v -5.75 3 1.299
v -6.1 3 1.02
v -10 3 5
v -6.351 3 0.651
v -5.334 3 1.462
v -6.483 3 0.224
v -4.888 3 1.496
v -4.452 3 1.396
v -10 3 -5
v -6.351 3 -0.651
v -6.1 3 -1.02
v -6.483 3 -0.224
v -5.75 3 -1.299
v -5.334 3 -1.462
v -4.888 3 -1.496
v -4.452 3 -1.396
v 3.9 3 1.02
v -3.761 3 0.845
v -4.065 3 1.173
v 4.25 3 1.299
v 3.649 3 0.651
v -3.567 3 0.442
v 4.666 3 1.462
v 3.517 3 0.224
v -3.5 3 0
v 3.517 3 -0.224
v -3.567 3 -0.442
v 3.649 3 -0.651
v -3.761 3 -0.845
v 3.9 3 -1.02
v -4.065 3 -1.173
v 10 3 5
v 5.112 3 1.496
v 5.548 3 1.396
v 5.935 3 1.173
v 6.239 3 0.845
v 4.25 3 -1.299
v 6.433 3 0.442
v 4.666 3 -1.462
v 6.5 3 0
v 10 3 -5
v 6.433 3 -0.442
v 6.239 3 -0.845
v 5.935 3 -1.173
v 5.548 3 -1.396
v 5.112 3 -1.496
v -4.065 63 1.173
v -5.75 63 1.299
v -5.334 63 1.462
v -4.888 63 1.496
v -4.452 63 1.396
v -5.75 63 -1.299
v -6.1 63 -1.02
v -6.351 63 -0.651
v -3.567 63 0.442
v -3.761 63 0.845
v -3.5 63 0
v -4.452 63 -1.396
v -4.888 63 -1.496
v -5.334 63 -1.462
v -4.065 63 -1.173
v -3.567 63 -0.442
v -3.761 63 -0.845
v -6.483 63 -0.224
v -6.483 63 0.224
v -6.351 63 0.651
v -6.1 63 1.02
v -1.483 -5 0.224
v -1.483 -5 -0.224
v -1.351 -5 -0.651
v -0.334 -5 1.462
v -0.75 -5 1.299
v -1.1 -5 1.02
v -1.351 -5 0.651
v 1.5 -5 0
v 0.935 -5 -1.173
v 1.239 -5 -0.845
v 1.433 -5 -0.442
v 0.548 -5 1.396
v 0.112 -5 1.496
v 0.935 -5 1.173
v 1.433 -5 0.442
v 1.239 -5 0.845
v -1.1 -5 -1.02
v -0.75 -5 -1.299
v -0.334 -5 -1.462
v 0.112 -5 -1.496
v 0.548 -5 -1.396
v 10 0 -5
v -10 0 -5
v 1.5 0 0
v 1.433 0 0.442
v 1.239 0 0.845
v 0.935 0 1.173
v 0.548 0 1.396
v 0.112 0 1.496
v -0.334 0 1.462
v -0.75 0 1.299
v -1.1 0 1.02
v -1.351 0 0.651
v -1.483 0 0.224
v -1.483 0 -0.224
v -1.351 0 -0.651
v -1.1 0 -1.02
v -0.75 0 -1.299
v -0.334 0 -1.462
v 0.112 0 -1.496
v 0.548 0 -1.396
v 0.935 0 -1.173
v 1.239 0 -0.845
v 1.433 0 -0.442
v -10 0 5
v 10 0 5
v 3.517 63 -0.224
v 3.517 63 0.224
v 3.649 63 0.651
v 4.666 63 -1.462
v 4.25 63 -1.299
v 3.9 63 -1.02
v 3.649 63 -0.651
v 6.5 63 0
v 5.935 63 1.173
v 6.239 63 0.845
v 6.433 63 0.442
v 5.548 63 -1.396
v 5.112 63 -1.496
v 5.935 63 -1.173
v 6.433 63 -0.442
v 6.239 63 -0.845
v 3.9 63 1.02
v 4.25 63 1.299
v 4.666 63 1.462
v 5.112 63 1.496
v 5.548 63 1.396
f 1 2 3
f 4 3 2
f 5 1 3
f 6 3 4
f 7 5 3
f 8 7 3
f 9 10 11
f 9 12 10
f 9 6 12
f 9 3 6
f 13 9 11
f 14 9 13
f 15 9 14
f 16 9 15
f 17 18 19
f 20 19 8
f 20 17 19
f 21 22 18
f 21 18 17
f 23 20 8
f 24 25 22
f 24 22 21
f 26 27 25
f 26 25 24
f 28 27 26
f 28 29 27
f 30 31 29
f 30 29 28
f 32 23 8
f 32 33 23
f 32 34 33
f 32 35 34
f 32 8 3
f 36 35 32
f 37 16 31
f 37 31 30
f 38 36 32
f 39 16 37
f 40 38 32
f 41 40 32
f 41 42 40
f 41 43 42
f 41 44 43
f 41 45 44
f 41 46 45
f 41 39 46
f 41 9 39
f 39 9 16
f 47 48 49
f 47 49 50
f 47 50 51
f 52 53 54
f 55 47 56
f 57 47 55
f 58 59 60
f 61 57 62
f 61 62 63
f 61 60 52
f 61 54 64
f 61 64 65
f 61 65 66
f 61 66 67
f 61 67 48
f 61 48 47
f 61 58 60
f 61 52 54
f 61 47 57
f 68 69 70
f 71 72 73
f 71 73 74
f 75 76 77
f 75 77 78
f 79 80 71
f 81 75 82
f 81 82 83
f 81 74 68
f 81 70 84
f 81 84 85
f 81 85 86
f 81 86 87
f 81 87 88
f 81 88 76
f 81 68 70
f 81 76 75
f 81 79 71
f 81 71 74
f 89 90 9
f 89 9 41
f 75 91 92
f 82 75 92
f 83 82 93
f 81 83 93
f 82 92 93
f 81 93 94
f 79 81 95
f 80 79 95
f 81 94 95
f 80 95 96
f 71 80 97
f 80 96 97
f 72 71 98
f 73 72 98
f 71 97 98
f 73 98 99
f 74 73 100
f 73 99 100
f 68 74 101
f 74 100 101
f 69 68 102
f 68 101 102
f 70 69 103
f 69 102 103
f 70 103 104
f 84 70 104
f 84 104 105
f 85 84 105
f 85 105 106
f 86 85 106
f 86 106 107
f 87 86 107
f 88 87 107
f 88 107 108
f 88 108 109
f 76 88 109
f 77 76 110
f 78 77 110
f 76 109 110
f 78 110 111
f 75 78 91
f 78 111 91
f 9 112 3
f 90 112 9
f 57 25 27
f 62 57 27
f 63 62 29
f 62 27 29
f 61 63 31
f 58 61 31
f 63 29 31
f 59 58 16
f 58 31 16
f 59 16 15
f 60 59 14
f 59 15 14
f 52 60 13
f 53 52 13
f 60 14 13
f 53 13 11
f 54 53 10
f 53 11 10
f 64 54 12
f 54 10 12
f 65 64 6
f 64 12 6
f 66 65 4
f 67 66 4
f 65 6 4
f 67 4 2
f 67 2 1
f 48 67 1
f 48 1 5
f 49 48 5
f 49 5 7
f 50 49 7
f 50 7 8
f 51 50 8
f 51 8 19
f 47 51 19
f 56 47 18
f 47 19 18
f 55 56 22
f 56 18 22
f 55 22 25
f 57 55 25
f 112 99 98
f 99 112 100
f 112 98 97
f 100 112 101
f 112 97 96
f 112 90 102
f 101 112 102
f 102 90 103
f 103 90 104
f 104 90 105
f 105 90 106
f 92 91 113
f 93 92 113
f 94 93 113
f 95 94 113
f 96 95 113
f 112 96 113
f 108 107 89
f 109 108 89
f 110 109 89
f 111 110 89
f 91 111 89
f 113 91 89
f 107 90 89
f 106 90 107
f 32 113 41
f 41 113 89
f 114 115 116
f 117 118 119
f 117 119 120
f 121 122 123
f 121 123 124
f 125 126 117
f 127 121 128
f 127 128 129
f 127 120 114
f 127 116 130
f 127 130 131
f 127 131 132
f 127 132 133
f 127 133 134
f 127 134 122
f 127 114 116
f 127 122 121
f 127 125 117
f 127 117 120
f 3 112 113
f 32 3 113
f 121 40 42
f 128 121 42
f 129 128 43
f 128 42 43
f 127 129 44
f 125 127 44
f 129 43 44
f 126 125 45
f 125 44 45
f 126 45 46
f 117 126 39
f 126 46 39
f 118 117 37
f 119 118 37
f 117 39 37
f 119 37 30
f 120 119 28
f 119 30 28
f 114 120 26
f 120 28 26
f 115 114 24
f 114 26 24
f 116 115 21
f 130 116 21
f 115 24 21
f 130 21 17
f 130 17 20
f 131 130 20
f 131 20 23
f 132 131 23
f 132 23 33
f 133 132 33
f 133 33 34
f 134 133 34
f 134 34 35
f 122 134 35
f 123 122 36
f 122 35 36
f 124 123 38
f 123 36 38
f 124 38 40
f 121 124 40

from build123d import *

# Parameters (mm, degrees)
SKETCH1_W           = 20
SKETCH1_H           = 10
BOSS_EXTRUDE1_DEPTH = 3
SKETCH2_R           = 1.5
BOSS_EXTRUDE2_DEPTH = 60
SKETCH3_R           = 1.5
BOSS_EXTRUDE3_DEPTH = 5


with BuildPart() as part:
    # Sketch1 → Boss-Extrude1 (new body)
    with BuildSketch(Plane(origin=(0, 0, 0), x_dir=(1, 0, 0), z_dir=(0, 1, 0))):
        Rectangle(SKETCH1_W, SKETCH1_H)
    extrude(amount=BOSS_EXTRUDE1_DEPTH)

    # Sketch2 → Boss-Extrude2 (add)
    with BuildSketch(Plane(origin=(0, 3, 0), x_dir=(1, 0, 0), z_dir=(0, 1, 0))):
        with Locations((-5, 0)):
            Circle(SKETCH2_R)
        with Locations((5, 0)):
            Circle(SKETCH2_R)
    extrude(amount=BOSS_EXTRUDE2_DEPTH)

    # Sketch3 → Boss-Extrude3 (add)
    with BuildSketch(Plane.XZ):
        Circle(SKETCH3_R)
    extrude(amount=BOSS_EXTRUDE3_DEPTH)


solid = part.part
